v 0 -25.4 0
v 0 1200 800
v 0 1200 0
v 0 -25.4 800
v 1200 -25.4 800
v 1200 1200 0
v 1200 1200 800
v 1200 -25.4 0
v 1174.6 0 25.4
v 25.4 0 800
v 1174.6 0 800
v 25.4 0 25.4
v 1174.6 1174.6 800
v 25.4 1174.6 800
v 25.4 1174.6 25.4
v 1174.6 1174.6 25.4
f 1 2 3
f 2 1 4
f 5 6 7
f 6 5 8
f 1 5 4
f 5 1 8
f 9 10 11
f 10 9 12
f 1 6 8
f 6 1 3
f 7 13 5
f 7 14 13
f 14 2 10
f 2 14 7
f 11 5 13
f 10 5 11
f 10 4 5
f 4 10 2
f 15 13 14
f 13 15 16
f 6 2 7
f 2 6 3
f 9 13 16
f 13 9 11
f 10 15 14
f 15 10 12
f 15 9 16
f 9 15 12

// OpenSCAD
tablaLargo= 1200;
tablaAncho=800;
tablaAlto= 25.4;


rotate([90,0,0])
cube([tablaLargo,tablaAncho,tablaAlto]);

translate([0,1200,0])
rotate([90,0,0])
cube([tablaLargo,tablaAncho,tablaAlto]);

translate([1200 -(tablaAlto),0,0])
rotate([90,0,90])
cube([tablaLargo,tablaAncho,tablaAlto]);

translate([0,0,0])
rotate([90,0,90])
cube([tablaLargo,tablaAncho,tablaAlto]);

translate([0,0,0])
rotate([0,0,0])
cube([tablaLargo,tablaLargo,tablaAlto]);
